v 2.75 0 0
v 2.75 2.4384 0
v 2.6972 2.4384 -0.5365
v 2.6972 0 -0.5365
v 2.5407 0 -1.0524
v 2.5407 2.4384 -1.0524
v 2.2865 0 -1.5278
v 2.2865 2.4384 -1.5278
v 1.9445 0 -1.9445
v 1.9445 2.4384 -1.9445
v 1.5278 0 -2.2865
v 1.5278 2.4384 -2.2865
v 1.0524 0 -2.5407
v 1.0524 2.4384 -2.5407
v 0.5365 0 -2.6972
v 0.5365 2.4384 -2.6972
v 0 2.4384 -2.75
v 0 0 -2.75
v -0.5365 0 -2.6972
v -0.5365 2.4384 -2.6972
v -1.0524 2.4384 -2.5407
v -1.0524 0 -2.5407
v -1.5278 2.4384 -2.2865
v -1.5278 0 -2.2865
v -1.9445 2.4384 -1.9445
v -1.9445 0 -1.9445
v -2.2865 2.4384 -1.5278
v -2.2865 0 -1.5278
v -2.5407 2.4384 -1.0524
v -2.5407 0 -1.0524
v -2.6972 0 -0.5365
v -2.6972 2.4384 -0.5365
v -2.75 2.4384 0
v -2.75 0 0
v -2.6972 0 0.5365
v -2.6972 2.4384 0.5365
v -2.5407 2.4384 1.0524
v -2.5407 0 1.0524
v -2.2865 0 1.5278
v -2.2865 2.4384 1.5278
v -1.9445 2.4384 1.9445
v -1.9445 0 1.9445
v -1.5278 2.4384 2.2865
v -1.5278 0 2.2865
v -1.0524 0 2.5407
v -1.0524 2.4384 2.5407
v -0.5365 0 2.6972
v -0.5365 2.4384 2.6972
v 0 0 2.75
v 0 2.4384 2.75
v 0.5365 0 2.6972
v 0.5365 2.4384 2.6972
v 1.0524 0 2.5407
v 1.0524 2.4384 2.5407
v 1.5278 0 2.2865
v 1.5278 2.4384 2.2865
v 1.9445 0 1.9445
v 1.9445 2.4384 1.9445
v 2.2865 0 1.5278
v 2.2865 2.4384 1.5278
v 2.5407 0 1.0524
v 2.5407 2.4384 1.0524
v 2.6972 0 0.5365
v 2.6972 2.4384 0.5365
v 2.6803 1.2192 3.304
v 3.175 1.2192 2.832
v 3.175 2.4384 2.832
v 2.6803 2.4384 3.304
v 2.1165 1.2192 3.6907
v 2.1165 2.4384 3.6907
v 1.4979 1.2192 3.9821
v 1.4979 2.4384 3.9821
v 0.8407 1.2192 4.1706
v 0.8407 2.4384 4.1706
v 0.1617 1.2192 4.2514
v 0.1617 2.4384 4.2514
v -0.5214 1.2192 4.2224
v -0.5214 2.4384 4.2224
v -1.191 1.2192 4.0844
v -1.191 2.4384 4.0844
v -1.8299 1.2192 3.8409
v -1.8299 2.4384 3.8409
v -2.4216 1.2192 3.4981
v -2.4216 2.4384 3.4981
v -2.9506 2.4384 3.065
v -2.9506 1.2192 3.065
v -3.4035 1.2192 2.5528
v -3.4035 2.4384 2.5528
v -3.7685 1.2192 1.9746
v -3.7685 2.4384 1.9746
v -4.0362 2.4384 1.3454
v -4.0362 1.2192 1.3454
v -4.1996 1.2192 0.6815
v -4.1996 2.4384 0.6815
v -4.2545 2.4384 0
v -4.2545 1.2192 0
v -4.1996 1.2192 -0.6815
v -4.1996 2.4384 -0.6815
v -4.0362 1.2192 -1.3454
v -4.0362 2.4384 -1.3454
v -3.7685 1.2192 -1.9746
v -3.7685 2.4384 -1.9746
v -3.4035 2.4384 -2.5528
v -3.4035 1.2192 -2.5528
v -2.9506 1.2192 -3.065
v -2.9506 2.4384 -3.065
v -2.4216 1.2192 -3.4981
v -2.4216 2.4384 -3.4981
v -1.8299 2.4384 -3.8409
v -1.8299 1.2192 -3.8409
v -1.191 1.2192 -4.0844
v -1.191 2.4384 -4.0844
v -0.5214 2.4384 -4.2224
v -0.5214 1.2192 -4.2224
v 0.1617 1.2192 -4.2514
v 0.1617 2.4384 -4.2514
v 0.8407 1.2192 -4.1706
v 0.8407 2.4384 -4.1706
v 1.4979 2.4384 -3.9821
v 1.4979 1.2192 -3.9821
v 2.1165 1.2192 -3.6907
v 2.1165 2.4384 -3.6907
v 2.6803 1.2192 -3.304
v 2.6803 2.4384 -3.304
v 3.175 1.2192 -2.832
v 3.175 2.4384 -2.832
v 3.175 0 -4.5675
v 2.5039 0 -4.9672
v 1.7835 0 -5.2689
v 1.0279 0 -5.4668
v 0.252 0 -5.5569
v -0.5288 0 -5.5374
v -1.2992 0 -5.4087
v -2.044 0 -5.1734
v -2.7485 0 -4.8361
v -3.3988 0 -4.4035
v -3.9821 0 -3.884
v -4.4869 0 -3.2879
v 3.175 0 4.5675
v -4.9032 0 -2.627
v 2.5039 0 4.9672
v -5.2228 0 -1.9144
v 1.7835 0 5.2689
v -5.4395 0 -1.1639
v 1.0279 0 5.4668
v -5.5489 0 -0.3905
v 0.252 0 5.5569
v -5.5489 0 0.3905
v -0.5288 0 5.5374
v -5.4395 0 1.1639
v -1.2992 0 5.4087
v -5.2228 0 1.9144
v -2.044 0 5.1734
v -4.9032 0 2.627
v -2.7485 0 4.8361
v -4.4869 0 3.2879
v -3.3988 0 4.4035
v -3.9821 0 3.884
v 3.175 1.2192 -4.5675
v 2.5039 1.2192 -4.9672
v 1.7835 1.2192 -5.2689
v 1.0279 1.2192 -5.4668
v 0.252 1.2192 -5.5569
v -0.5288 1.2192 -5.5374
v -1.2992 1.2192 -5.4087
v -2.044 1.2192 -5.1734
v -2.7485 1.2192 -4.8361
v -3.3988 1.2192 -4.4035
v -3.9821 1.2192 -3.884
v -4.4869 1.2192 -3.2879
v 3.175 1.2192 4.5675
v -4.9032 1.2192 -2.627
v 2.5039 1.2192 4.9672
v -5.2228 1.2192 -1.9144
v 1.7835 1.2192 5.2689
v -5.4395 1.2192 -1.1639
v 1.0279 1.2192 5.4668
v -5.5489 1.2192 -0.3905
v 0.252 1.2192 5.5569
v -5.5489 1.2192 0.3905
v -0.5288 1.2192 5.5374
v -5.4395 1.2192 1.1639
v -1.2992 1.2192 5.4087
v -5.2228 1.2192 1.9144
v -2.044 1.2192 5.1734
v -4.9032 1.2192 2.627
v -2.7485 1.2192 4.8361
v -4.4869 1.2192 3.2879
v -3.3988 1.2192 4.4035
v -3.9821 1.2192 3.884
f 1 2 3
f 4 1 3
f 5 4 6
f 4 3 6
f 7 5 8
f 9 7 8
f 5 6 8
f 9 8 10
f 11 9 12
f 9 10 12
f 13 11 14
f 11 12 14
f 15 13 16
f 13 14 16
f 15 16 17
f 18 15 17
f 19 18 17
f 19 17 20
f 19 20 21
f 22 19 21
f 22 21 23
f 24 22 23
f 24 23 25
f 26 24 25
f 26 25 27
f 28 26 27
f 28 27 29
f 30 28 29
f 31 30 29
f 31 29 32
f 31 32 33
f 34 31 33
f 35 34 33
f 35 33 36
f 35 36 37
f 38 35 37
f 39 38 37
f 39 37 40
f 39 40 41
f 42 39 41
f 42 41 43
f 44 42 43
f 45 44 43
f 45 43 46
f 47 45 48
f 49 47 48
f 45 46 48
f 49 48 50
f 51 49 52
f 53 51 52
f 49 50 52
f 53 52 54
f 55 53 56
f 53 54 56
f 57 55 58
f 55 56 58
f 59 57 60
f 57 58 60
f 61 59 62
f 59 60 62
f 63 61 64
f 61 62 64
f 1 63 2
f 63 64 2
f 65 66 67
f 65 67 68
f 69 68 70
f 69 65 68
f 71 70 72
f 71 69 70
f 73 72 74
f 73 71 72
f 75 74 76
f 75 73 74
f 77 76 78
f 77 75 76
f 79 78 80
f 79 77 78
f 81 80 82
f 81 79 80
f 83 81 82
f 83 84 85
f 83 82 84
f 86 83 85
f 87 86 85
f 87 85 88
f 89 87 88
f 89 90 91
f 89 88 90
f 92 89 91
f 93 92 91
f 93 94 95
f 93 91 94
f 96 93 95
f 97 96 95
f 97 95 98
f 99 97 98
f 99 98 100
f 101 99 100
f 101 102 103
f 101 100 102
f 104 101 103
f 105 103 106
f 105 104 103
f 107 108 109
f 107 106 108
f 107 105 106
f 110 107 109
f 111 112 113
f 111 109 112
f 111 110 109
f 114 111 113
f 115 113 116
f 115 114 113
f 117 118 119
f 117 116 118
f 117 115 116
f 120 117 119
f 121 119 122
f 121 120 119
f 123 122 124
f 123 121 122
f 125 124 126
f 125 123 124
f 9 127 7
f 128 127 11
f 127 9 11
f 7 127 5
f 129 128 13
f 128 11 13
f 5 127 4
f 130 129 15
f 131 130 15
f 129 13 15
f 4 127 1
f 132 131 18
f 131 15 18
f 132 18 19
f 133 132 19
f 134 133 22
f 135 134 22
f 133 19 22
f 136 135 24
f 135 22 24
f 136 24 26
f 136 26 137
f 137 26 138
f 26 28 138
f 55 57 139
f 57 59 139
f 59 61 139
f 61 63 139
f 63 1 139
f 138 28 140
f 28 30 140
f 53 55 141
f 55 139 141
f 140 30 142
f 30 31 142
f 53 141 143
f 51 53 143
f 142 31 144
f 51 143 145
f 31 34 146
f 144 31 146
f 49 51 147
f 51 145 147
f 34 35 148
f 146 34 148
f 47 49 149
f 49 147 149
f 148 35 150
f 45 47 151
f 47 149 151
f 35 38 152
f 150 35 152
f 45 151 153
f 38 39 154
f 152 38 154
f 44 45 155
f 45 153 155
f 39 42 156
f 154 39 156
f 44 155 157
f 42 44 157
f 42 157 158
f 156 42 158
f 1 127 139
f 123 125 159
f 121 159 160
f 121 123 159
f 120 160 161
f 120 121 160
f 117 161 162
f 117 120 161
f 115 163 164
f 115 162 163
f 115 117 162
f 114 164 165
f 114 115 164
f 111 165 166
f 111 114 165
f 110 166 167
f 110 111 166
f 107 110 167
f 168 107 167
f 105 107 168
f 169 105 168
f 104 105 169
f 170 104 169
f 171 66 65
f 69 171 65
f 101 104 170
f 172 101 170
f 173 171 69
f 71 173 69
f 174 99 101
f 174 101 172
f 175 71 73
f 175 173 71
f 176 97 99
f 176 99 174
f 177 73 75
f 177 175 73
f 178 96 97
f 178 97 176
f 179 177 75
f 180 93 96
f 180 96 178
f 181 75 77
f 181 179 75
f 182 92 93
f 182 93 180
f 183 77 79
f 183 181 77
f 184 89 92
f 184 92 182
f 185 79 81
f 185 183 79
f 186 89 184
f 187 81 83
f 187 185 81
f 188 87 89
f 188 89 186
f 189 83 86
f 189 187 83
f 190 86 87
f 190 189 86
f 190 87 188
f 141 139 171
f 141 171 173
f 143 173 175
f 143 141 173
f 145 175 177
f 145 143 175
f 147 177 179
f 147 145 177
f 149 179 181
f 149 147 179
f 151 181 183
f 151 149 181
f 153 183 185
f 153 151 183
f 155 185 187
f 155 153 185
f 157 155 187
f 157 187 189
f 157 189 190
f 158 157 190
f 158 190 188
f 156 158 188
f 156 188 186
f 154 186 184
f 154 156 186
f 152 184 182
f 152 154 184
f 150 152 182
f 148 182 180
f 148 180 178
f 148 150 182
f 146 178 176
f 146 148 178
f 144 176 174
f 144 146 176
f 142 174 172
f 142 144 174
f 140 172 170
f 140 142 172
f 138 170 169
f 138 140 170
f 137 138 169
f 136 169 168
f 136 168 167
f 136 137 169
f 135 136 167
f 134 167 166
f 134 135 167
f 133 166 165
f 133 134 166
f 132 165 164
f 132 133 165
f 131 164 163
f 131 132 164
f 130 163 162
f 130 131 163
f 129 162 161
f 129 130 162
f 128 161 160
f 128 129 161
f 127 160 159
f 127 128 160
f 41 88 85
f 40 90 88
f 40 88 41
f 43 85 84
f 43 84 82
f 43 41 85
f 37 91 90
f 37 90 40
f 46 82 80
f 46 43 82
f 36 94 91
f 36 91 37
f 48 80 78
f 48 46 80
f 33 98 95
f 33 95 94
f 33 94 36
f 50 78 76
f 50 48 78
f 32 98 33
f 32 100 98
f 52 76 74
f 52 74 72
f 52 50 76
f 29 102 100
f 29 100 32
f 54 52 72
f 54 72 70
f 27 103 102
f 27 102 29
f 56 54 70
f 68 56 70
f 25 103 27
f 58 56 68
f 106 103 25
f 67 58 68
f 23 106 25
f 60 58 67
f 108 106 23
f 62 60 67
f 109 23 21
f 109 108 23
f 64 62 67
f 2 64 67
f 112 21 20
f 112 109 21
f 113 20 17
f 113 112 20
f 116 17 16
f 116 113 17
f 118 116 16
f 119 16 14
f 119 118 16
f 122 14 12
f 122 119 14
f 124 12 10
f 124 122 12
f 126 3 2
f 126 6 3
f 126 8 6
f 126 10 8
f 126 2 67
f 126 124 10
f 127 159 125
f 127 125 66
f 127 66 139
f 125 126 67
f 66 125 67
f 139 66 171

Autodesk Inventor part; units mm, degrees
ref_plane "YZ Plane" through (0, 0, 0) normal (1, 0, 0) x (0, 1, 0)
ref_plane "XZ Plane" through (0, 0, 0) normal (0, 1, 0) x (-1, 0, 0)
ref_plane "XY Plane" through (0, 0, 0) normal (0, 0, 1) x (1, 0, 0)
sketch "Sketch1" plane through (0, 0, 0) normal (0, 1, 0) x (-1, 0, 0)
  circle A0 centre (0, 0) radius 5.5626
  dimension "d0" = 11.1252
extrude "Extrusion1" add sketch "Sketch1" along normal blind 1.2192
sketch "Sketch2" plane through (0, 1.2192, 0) normal (0, 1, 0) x (1, 0, 0)
  circle A0 centre (0, 0) radius 4.2545
  dimension "d3" = 8.509
extrude "Extrusion2" add sketch "Sketch2" along normal blind 1.2192
sketch "Sketch3" plane through (0, 2.4384, 0) normal (0, 1, 0) x (1, 0, 0)
  circle A0 centre (0, 0) radius 2.75
  dimension "d6" = 5.5
extrude "Extrusion3" cut sketch "Sketch3" against normal blind 4.064
sketch "Sketch4" plane through (0, 2.4384, 0) normal (0, 1, 0) x (1, 0, 0)
  line L0 (15.9461, 14.0442) -> (3.175, 14.0442)
  line L1 (3.175, 14.0442) -> (3.175, -15.9032)
  line L2 (3.175, -15.9032) -> (15.9461, -15.9032)
  line L3 (15.9461, -15.9032) -> (15.9461, 14.0442)
  point P0 (0, 0)
  dimension "d9" = 3.175
extrude "Extrusion4" cut sketch "Sketch4" against normal blind 4.064
properties part number "Spring Clamp Small"
